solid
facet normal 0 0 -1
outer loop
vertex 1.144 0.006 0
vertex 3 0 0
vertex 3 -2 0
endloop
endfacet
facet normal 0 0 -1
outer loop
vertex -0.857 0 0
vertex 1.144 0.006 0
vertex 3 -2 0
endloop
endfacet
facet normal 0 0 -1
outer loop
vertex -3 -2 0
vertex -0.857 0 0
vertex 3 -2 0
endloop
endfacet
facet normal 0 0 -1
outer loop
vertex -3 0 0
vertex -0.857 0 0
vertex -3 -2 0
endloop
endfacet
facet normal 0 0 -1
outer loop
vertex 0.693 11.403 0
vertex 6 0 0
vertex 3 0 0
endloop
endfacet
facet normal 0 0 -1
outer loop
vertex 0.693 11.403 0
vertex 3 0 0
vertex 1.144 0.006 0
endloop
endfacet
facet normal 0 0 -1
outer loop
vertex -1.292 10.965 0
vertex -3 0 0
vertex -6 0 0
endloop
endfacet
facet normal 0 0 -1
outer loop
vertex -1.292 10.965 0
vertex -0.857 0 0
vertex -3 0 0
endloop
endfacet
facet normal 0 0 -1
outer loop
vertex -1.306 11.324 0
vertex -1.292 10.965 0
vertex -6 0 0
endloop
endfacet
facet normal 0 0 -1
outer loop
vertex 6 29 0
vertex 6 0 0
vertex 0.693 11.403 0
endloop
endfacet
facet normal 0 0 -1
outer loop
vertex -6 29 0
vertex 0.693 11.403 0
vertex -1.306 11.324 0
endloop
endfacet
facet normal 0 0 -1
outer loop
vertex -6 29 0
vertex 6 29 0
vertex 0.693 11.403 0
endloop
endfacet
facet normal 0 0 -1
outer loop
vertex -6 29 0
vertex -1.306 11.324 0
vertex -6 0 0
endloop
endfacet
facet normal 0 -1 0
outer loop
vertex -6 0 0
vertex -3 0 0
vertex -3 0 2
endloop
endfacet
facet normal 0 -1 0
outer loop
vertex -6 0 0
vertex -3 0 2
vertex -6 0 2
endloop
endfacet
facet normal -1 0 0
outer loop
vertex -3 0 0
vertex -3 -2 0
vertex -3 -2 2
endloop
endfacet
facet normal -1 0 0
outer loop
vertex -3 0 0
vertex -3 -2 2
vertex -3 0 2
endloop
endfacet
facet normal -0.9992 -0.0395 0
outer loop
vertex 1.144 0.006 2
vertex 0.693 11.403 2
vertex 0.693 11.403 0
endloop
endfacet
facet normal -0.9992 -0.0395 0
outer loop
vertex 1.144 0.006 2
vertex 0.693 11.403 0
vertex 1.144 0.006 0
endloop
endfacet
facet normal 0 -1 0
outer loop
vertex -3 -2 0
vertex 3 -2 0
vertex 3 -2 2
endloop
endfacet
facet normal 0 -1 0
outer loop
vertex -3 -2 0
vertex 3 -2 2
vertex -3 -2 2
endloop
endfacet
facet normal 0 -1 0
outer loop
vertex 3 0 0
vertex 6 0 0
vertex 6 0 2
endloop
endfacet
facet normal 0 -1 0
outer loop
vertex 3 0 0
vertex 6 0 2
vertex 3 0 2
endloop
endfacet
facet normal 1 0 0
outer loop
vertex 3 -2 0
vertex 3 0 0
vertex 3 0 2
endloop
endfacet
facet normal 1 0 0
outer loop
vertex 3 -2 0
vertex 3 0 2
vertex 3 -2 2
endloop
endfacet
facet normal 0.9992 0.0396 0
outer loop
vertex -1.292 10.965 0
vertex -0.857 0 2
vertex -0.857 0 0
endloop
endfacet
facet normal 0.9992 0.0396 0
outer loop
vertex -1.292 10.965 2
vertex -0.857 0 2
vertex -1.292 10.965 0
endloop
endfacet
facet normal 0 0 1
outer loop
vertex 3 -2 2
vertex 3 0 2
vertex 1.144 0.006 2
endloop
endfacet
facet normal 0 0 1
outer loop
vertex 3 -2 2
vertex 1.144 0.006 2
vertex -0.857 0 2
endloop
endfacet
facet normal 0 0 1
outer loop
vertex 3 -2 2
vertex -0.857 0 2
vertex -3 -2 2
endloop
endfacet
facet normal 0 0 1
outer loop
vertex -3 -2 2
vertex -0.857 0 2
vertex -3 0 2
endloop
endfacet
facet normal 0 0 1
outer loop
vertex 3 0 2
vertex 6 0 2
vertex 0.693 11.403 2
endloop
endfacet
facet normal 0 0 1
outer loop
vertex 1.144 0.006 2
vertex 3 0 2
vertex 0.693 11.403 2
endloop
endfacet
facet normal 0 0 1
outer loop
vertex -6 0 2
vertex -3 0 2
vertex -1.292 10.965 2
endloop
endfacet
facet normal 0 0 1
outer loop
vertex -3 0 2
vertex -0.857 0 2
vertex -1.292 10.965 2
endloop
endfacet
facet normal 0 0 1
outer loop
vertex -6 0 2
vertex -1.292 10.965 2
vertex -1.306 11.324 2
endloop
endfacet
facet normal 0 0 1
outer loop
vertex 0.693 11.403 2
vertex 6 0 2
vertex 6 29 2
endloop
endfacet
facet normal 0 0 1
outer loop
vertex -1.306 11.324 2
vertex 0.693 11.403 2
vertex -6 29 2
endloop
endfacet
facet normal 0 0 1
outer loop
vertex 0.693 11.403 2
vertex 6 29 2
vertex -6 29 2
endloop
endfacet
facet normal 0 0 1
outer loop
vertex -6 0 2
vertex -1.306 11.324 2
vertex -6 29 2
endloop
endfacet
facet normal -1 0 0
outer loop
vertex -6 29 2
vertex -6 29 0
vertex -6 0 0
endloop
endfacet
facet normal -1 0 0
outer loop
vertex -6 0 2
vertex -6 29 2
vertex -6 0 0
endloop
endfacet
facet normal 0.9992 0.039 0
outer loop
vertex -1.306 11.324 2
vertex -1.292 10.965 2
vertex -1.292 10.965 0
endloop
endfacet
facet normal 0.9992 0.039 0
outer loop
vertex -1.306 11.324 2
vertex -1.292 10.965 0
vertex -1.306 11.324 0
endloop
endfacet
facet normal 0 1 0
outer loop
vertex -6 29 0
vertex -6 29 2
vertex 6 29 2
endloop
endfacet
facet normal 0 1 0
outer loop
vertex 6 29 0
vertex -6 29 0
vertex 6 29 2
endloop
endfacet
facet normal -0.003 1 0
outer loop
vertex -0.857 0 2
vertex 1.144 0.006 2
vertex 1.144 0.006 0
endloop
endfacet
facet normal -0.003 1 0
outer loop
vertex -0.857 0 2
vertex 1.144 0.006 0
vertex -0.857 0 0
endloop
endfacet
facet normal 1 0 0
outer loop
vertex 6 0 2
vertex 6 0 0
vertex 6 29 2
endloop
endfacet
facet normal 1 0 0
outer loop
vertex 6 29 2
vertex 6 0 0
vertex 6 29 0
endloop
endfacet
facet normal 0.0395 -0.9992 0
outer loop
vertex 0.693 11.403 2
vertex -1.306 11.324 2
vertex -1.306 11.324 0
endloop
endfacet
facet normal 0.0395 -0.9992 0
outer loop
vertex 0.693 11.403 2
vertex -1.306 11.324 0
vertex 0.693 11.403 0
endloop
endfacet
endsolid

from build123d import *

# Parameters (mm, degrees)
EXTRUDE_1_DEPTH     = 2
SKETCH_3_W          = 12
SKETCH_3_H          = 1.078774048
CUT_EXTRUDE_2_DEPTH = 10
CUT_EXTRUDE_3_DEPTH = 2


with BuildPart() as part:
    # 草图1 → 凸台-拉伸1 (new body)
    with BuildSketch(Plane.XY):
        Polygon((-6, 0), (-6, 15), (-6, 30.078774409), (6, 30.078774409), (6, 15), (6, 0), (3, 0), (3, -2), (-3, -2), (-3, 0), align=None)
    extrude(amount=EXTRUDE_1_DEPTH)

    # 草图3 → 切除-拉伸2 (cut)
    with BuildSketch(Plane.XY.offset(2)):
        with Locations((0, 29.539387385)):
            Rectangle(SKETCH_3_W, SKETCH_3_H)
        Polygon((6, 29.000000361), (10.298878861, 29.000000361), (10.298878861, 34.143483695), (-9.585000786, 34.143483695), (-9.585000786, 29.000000361), (-6, 29.000000361), (-6, 30.078774409), (6, 30.078774409), align=None)
    extrude(amount=-CUT_EXTRUDE_2_DEPTH, mode=Mode.SUBTRACT)

    # 草图4 → 切除-拉伸3 (cut)
    with BuildSketch(Plane.XY.offset(2)):
        Polygon((1.144251734, 0.005791625), (-0.857088089, 0), (-1.291547484, 10.965059679), (-1.305754189, 11.323614176), (0.692677741, 11.402796374), align=None)
    extrude(amount=-CUT_EXTRUDE_3_DEPTH, mode=Mode.SUBTRACT)


solid = part.part
